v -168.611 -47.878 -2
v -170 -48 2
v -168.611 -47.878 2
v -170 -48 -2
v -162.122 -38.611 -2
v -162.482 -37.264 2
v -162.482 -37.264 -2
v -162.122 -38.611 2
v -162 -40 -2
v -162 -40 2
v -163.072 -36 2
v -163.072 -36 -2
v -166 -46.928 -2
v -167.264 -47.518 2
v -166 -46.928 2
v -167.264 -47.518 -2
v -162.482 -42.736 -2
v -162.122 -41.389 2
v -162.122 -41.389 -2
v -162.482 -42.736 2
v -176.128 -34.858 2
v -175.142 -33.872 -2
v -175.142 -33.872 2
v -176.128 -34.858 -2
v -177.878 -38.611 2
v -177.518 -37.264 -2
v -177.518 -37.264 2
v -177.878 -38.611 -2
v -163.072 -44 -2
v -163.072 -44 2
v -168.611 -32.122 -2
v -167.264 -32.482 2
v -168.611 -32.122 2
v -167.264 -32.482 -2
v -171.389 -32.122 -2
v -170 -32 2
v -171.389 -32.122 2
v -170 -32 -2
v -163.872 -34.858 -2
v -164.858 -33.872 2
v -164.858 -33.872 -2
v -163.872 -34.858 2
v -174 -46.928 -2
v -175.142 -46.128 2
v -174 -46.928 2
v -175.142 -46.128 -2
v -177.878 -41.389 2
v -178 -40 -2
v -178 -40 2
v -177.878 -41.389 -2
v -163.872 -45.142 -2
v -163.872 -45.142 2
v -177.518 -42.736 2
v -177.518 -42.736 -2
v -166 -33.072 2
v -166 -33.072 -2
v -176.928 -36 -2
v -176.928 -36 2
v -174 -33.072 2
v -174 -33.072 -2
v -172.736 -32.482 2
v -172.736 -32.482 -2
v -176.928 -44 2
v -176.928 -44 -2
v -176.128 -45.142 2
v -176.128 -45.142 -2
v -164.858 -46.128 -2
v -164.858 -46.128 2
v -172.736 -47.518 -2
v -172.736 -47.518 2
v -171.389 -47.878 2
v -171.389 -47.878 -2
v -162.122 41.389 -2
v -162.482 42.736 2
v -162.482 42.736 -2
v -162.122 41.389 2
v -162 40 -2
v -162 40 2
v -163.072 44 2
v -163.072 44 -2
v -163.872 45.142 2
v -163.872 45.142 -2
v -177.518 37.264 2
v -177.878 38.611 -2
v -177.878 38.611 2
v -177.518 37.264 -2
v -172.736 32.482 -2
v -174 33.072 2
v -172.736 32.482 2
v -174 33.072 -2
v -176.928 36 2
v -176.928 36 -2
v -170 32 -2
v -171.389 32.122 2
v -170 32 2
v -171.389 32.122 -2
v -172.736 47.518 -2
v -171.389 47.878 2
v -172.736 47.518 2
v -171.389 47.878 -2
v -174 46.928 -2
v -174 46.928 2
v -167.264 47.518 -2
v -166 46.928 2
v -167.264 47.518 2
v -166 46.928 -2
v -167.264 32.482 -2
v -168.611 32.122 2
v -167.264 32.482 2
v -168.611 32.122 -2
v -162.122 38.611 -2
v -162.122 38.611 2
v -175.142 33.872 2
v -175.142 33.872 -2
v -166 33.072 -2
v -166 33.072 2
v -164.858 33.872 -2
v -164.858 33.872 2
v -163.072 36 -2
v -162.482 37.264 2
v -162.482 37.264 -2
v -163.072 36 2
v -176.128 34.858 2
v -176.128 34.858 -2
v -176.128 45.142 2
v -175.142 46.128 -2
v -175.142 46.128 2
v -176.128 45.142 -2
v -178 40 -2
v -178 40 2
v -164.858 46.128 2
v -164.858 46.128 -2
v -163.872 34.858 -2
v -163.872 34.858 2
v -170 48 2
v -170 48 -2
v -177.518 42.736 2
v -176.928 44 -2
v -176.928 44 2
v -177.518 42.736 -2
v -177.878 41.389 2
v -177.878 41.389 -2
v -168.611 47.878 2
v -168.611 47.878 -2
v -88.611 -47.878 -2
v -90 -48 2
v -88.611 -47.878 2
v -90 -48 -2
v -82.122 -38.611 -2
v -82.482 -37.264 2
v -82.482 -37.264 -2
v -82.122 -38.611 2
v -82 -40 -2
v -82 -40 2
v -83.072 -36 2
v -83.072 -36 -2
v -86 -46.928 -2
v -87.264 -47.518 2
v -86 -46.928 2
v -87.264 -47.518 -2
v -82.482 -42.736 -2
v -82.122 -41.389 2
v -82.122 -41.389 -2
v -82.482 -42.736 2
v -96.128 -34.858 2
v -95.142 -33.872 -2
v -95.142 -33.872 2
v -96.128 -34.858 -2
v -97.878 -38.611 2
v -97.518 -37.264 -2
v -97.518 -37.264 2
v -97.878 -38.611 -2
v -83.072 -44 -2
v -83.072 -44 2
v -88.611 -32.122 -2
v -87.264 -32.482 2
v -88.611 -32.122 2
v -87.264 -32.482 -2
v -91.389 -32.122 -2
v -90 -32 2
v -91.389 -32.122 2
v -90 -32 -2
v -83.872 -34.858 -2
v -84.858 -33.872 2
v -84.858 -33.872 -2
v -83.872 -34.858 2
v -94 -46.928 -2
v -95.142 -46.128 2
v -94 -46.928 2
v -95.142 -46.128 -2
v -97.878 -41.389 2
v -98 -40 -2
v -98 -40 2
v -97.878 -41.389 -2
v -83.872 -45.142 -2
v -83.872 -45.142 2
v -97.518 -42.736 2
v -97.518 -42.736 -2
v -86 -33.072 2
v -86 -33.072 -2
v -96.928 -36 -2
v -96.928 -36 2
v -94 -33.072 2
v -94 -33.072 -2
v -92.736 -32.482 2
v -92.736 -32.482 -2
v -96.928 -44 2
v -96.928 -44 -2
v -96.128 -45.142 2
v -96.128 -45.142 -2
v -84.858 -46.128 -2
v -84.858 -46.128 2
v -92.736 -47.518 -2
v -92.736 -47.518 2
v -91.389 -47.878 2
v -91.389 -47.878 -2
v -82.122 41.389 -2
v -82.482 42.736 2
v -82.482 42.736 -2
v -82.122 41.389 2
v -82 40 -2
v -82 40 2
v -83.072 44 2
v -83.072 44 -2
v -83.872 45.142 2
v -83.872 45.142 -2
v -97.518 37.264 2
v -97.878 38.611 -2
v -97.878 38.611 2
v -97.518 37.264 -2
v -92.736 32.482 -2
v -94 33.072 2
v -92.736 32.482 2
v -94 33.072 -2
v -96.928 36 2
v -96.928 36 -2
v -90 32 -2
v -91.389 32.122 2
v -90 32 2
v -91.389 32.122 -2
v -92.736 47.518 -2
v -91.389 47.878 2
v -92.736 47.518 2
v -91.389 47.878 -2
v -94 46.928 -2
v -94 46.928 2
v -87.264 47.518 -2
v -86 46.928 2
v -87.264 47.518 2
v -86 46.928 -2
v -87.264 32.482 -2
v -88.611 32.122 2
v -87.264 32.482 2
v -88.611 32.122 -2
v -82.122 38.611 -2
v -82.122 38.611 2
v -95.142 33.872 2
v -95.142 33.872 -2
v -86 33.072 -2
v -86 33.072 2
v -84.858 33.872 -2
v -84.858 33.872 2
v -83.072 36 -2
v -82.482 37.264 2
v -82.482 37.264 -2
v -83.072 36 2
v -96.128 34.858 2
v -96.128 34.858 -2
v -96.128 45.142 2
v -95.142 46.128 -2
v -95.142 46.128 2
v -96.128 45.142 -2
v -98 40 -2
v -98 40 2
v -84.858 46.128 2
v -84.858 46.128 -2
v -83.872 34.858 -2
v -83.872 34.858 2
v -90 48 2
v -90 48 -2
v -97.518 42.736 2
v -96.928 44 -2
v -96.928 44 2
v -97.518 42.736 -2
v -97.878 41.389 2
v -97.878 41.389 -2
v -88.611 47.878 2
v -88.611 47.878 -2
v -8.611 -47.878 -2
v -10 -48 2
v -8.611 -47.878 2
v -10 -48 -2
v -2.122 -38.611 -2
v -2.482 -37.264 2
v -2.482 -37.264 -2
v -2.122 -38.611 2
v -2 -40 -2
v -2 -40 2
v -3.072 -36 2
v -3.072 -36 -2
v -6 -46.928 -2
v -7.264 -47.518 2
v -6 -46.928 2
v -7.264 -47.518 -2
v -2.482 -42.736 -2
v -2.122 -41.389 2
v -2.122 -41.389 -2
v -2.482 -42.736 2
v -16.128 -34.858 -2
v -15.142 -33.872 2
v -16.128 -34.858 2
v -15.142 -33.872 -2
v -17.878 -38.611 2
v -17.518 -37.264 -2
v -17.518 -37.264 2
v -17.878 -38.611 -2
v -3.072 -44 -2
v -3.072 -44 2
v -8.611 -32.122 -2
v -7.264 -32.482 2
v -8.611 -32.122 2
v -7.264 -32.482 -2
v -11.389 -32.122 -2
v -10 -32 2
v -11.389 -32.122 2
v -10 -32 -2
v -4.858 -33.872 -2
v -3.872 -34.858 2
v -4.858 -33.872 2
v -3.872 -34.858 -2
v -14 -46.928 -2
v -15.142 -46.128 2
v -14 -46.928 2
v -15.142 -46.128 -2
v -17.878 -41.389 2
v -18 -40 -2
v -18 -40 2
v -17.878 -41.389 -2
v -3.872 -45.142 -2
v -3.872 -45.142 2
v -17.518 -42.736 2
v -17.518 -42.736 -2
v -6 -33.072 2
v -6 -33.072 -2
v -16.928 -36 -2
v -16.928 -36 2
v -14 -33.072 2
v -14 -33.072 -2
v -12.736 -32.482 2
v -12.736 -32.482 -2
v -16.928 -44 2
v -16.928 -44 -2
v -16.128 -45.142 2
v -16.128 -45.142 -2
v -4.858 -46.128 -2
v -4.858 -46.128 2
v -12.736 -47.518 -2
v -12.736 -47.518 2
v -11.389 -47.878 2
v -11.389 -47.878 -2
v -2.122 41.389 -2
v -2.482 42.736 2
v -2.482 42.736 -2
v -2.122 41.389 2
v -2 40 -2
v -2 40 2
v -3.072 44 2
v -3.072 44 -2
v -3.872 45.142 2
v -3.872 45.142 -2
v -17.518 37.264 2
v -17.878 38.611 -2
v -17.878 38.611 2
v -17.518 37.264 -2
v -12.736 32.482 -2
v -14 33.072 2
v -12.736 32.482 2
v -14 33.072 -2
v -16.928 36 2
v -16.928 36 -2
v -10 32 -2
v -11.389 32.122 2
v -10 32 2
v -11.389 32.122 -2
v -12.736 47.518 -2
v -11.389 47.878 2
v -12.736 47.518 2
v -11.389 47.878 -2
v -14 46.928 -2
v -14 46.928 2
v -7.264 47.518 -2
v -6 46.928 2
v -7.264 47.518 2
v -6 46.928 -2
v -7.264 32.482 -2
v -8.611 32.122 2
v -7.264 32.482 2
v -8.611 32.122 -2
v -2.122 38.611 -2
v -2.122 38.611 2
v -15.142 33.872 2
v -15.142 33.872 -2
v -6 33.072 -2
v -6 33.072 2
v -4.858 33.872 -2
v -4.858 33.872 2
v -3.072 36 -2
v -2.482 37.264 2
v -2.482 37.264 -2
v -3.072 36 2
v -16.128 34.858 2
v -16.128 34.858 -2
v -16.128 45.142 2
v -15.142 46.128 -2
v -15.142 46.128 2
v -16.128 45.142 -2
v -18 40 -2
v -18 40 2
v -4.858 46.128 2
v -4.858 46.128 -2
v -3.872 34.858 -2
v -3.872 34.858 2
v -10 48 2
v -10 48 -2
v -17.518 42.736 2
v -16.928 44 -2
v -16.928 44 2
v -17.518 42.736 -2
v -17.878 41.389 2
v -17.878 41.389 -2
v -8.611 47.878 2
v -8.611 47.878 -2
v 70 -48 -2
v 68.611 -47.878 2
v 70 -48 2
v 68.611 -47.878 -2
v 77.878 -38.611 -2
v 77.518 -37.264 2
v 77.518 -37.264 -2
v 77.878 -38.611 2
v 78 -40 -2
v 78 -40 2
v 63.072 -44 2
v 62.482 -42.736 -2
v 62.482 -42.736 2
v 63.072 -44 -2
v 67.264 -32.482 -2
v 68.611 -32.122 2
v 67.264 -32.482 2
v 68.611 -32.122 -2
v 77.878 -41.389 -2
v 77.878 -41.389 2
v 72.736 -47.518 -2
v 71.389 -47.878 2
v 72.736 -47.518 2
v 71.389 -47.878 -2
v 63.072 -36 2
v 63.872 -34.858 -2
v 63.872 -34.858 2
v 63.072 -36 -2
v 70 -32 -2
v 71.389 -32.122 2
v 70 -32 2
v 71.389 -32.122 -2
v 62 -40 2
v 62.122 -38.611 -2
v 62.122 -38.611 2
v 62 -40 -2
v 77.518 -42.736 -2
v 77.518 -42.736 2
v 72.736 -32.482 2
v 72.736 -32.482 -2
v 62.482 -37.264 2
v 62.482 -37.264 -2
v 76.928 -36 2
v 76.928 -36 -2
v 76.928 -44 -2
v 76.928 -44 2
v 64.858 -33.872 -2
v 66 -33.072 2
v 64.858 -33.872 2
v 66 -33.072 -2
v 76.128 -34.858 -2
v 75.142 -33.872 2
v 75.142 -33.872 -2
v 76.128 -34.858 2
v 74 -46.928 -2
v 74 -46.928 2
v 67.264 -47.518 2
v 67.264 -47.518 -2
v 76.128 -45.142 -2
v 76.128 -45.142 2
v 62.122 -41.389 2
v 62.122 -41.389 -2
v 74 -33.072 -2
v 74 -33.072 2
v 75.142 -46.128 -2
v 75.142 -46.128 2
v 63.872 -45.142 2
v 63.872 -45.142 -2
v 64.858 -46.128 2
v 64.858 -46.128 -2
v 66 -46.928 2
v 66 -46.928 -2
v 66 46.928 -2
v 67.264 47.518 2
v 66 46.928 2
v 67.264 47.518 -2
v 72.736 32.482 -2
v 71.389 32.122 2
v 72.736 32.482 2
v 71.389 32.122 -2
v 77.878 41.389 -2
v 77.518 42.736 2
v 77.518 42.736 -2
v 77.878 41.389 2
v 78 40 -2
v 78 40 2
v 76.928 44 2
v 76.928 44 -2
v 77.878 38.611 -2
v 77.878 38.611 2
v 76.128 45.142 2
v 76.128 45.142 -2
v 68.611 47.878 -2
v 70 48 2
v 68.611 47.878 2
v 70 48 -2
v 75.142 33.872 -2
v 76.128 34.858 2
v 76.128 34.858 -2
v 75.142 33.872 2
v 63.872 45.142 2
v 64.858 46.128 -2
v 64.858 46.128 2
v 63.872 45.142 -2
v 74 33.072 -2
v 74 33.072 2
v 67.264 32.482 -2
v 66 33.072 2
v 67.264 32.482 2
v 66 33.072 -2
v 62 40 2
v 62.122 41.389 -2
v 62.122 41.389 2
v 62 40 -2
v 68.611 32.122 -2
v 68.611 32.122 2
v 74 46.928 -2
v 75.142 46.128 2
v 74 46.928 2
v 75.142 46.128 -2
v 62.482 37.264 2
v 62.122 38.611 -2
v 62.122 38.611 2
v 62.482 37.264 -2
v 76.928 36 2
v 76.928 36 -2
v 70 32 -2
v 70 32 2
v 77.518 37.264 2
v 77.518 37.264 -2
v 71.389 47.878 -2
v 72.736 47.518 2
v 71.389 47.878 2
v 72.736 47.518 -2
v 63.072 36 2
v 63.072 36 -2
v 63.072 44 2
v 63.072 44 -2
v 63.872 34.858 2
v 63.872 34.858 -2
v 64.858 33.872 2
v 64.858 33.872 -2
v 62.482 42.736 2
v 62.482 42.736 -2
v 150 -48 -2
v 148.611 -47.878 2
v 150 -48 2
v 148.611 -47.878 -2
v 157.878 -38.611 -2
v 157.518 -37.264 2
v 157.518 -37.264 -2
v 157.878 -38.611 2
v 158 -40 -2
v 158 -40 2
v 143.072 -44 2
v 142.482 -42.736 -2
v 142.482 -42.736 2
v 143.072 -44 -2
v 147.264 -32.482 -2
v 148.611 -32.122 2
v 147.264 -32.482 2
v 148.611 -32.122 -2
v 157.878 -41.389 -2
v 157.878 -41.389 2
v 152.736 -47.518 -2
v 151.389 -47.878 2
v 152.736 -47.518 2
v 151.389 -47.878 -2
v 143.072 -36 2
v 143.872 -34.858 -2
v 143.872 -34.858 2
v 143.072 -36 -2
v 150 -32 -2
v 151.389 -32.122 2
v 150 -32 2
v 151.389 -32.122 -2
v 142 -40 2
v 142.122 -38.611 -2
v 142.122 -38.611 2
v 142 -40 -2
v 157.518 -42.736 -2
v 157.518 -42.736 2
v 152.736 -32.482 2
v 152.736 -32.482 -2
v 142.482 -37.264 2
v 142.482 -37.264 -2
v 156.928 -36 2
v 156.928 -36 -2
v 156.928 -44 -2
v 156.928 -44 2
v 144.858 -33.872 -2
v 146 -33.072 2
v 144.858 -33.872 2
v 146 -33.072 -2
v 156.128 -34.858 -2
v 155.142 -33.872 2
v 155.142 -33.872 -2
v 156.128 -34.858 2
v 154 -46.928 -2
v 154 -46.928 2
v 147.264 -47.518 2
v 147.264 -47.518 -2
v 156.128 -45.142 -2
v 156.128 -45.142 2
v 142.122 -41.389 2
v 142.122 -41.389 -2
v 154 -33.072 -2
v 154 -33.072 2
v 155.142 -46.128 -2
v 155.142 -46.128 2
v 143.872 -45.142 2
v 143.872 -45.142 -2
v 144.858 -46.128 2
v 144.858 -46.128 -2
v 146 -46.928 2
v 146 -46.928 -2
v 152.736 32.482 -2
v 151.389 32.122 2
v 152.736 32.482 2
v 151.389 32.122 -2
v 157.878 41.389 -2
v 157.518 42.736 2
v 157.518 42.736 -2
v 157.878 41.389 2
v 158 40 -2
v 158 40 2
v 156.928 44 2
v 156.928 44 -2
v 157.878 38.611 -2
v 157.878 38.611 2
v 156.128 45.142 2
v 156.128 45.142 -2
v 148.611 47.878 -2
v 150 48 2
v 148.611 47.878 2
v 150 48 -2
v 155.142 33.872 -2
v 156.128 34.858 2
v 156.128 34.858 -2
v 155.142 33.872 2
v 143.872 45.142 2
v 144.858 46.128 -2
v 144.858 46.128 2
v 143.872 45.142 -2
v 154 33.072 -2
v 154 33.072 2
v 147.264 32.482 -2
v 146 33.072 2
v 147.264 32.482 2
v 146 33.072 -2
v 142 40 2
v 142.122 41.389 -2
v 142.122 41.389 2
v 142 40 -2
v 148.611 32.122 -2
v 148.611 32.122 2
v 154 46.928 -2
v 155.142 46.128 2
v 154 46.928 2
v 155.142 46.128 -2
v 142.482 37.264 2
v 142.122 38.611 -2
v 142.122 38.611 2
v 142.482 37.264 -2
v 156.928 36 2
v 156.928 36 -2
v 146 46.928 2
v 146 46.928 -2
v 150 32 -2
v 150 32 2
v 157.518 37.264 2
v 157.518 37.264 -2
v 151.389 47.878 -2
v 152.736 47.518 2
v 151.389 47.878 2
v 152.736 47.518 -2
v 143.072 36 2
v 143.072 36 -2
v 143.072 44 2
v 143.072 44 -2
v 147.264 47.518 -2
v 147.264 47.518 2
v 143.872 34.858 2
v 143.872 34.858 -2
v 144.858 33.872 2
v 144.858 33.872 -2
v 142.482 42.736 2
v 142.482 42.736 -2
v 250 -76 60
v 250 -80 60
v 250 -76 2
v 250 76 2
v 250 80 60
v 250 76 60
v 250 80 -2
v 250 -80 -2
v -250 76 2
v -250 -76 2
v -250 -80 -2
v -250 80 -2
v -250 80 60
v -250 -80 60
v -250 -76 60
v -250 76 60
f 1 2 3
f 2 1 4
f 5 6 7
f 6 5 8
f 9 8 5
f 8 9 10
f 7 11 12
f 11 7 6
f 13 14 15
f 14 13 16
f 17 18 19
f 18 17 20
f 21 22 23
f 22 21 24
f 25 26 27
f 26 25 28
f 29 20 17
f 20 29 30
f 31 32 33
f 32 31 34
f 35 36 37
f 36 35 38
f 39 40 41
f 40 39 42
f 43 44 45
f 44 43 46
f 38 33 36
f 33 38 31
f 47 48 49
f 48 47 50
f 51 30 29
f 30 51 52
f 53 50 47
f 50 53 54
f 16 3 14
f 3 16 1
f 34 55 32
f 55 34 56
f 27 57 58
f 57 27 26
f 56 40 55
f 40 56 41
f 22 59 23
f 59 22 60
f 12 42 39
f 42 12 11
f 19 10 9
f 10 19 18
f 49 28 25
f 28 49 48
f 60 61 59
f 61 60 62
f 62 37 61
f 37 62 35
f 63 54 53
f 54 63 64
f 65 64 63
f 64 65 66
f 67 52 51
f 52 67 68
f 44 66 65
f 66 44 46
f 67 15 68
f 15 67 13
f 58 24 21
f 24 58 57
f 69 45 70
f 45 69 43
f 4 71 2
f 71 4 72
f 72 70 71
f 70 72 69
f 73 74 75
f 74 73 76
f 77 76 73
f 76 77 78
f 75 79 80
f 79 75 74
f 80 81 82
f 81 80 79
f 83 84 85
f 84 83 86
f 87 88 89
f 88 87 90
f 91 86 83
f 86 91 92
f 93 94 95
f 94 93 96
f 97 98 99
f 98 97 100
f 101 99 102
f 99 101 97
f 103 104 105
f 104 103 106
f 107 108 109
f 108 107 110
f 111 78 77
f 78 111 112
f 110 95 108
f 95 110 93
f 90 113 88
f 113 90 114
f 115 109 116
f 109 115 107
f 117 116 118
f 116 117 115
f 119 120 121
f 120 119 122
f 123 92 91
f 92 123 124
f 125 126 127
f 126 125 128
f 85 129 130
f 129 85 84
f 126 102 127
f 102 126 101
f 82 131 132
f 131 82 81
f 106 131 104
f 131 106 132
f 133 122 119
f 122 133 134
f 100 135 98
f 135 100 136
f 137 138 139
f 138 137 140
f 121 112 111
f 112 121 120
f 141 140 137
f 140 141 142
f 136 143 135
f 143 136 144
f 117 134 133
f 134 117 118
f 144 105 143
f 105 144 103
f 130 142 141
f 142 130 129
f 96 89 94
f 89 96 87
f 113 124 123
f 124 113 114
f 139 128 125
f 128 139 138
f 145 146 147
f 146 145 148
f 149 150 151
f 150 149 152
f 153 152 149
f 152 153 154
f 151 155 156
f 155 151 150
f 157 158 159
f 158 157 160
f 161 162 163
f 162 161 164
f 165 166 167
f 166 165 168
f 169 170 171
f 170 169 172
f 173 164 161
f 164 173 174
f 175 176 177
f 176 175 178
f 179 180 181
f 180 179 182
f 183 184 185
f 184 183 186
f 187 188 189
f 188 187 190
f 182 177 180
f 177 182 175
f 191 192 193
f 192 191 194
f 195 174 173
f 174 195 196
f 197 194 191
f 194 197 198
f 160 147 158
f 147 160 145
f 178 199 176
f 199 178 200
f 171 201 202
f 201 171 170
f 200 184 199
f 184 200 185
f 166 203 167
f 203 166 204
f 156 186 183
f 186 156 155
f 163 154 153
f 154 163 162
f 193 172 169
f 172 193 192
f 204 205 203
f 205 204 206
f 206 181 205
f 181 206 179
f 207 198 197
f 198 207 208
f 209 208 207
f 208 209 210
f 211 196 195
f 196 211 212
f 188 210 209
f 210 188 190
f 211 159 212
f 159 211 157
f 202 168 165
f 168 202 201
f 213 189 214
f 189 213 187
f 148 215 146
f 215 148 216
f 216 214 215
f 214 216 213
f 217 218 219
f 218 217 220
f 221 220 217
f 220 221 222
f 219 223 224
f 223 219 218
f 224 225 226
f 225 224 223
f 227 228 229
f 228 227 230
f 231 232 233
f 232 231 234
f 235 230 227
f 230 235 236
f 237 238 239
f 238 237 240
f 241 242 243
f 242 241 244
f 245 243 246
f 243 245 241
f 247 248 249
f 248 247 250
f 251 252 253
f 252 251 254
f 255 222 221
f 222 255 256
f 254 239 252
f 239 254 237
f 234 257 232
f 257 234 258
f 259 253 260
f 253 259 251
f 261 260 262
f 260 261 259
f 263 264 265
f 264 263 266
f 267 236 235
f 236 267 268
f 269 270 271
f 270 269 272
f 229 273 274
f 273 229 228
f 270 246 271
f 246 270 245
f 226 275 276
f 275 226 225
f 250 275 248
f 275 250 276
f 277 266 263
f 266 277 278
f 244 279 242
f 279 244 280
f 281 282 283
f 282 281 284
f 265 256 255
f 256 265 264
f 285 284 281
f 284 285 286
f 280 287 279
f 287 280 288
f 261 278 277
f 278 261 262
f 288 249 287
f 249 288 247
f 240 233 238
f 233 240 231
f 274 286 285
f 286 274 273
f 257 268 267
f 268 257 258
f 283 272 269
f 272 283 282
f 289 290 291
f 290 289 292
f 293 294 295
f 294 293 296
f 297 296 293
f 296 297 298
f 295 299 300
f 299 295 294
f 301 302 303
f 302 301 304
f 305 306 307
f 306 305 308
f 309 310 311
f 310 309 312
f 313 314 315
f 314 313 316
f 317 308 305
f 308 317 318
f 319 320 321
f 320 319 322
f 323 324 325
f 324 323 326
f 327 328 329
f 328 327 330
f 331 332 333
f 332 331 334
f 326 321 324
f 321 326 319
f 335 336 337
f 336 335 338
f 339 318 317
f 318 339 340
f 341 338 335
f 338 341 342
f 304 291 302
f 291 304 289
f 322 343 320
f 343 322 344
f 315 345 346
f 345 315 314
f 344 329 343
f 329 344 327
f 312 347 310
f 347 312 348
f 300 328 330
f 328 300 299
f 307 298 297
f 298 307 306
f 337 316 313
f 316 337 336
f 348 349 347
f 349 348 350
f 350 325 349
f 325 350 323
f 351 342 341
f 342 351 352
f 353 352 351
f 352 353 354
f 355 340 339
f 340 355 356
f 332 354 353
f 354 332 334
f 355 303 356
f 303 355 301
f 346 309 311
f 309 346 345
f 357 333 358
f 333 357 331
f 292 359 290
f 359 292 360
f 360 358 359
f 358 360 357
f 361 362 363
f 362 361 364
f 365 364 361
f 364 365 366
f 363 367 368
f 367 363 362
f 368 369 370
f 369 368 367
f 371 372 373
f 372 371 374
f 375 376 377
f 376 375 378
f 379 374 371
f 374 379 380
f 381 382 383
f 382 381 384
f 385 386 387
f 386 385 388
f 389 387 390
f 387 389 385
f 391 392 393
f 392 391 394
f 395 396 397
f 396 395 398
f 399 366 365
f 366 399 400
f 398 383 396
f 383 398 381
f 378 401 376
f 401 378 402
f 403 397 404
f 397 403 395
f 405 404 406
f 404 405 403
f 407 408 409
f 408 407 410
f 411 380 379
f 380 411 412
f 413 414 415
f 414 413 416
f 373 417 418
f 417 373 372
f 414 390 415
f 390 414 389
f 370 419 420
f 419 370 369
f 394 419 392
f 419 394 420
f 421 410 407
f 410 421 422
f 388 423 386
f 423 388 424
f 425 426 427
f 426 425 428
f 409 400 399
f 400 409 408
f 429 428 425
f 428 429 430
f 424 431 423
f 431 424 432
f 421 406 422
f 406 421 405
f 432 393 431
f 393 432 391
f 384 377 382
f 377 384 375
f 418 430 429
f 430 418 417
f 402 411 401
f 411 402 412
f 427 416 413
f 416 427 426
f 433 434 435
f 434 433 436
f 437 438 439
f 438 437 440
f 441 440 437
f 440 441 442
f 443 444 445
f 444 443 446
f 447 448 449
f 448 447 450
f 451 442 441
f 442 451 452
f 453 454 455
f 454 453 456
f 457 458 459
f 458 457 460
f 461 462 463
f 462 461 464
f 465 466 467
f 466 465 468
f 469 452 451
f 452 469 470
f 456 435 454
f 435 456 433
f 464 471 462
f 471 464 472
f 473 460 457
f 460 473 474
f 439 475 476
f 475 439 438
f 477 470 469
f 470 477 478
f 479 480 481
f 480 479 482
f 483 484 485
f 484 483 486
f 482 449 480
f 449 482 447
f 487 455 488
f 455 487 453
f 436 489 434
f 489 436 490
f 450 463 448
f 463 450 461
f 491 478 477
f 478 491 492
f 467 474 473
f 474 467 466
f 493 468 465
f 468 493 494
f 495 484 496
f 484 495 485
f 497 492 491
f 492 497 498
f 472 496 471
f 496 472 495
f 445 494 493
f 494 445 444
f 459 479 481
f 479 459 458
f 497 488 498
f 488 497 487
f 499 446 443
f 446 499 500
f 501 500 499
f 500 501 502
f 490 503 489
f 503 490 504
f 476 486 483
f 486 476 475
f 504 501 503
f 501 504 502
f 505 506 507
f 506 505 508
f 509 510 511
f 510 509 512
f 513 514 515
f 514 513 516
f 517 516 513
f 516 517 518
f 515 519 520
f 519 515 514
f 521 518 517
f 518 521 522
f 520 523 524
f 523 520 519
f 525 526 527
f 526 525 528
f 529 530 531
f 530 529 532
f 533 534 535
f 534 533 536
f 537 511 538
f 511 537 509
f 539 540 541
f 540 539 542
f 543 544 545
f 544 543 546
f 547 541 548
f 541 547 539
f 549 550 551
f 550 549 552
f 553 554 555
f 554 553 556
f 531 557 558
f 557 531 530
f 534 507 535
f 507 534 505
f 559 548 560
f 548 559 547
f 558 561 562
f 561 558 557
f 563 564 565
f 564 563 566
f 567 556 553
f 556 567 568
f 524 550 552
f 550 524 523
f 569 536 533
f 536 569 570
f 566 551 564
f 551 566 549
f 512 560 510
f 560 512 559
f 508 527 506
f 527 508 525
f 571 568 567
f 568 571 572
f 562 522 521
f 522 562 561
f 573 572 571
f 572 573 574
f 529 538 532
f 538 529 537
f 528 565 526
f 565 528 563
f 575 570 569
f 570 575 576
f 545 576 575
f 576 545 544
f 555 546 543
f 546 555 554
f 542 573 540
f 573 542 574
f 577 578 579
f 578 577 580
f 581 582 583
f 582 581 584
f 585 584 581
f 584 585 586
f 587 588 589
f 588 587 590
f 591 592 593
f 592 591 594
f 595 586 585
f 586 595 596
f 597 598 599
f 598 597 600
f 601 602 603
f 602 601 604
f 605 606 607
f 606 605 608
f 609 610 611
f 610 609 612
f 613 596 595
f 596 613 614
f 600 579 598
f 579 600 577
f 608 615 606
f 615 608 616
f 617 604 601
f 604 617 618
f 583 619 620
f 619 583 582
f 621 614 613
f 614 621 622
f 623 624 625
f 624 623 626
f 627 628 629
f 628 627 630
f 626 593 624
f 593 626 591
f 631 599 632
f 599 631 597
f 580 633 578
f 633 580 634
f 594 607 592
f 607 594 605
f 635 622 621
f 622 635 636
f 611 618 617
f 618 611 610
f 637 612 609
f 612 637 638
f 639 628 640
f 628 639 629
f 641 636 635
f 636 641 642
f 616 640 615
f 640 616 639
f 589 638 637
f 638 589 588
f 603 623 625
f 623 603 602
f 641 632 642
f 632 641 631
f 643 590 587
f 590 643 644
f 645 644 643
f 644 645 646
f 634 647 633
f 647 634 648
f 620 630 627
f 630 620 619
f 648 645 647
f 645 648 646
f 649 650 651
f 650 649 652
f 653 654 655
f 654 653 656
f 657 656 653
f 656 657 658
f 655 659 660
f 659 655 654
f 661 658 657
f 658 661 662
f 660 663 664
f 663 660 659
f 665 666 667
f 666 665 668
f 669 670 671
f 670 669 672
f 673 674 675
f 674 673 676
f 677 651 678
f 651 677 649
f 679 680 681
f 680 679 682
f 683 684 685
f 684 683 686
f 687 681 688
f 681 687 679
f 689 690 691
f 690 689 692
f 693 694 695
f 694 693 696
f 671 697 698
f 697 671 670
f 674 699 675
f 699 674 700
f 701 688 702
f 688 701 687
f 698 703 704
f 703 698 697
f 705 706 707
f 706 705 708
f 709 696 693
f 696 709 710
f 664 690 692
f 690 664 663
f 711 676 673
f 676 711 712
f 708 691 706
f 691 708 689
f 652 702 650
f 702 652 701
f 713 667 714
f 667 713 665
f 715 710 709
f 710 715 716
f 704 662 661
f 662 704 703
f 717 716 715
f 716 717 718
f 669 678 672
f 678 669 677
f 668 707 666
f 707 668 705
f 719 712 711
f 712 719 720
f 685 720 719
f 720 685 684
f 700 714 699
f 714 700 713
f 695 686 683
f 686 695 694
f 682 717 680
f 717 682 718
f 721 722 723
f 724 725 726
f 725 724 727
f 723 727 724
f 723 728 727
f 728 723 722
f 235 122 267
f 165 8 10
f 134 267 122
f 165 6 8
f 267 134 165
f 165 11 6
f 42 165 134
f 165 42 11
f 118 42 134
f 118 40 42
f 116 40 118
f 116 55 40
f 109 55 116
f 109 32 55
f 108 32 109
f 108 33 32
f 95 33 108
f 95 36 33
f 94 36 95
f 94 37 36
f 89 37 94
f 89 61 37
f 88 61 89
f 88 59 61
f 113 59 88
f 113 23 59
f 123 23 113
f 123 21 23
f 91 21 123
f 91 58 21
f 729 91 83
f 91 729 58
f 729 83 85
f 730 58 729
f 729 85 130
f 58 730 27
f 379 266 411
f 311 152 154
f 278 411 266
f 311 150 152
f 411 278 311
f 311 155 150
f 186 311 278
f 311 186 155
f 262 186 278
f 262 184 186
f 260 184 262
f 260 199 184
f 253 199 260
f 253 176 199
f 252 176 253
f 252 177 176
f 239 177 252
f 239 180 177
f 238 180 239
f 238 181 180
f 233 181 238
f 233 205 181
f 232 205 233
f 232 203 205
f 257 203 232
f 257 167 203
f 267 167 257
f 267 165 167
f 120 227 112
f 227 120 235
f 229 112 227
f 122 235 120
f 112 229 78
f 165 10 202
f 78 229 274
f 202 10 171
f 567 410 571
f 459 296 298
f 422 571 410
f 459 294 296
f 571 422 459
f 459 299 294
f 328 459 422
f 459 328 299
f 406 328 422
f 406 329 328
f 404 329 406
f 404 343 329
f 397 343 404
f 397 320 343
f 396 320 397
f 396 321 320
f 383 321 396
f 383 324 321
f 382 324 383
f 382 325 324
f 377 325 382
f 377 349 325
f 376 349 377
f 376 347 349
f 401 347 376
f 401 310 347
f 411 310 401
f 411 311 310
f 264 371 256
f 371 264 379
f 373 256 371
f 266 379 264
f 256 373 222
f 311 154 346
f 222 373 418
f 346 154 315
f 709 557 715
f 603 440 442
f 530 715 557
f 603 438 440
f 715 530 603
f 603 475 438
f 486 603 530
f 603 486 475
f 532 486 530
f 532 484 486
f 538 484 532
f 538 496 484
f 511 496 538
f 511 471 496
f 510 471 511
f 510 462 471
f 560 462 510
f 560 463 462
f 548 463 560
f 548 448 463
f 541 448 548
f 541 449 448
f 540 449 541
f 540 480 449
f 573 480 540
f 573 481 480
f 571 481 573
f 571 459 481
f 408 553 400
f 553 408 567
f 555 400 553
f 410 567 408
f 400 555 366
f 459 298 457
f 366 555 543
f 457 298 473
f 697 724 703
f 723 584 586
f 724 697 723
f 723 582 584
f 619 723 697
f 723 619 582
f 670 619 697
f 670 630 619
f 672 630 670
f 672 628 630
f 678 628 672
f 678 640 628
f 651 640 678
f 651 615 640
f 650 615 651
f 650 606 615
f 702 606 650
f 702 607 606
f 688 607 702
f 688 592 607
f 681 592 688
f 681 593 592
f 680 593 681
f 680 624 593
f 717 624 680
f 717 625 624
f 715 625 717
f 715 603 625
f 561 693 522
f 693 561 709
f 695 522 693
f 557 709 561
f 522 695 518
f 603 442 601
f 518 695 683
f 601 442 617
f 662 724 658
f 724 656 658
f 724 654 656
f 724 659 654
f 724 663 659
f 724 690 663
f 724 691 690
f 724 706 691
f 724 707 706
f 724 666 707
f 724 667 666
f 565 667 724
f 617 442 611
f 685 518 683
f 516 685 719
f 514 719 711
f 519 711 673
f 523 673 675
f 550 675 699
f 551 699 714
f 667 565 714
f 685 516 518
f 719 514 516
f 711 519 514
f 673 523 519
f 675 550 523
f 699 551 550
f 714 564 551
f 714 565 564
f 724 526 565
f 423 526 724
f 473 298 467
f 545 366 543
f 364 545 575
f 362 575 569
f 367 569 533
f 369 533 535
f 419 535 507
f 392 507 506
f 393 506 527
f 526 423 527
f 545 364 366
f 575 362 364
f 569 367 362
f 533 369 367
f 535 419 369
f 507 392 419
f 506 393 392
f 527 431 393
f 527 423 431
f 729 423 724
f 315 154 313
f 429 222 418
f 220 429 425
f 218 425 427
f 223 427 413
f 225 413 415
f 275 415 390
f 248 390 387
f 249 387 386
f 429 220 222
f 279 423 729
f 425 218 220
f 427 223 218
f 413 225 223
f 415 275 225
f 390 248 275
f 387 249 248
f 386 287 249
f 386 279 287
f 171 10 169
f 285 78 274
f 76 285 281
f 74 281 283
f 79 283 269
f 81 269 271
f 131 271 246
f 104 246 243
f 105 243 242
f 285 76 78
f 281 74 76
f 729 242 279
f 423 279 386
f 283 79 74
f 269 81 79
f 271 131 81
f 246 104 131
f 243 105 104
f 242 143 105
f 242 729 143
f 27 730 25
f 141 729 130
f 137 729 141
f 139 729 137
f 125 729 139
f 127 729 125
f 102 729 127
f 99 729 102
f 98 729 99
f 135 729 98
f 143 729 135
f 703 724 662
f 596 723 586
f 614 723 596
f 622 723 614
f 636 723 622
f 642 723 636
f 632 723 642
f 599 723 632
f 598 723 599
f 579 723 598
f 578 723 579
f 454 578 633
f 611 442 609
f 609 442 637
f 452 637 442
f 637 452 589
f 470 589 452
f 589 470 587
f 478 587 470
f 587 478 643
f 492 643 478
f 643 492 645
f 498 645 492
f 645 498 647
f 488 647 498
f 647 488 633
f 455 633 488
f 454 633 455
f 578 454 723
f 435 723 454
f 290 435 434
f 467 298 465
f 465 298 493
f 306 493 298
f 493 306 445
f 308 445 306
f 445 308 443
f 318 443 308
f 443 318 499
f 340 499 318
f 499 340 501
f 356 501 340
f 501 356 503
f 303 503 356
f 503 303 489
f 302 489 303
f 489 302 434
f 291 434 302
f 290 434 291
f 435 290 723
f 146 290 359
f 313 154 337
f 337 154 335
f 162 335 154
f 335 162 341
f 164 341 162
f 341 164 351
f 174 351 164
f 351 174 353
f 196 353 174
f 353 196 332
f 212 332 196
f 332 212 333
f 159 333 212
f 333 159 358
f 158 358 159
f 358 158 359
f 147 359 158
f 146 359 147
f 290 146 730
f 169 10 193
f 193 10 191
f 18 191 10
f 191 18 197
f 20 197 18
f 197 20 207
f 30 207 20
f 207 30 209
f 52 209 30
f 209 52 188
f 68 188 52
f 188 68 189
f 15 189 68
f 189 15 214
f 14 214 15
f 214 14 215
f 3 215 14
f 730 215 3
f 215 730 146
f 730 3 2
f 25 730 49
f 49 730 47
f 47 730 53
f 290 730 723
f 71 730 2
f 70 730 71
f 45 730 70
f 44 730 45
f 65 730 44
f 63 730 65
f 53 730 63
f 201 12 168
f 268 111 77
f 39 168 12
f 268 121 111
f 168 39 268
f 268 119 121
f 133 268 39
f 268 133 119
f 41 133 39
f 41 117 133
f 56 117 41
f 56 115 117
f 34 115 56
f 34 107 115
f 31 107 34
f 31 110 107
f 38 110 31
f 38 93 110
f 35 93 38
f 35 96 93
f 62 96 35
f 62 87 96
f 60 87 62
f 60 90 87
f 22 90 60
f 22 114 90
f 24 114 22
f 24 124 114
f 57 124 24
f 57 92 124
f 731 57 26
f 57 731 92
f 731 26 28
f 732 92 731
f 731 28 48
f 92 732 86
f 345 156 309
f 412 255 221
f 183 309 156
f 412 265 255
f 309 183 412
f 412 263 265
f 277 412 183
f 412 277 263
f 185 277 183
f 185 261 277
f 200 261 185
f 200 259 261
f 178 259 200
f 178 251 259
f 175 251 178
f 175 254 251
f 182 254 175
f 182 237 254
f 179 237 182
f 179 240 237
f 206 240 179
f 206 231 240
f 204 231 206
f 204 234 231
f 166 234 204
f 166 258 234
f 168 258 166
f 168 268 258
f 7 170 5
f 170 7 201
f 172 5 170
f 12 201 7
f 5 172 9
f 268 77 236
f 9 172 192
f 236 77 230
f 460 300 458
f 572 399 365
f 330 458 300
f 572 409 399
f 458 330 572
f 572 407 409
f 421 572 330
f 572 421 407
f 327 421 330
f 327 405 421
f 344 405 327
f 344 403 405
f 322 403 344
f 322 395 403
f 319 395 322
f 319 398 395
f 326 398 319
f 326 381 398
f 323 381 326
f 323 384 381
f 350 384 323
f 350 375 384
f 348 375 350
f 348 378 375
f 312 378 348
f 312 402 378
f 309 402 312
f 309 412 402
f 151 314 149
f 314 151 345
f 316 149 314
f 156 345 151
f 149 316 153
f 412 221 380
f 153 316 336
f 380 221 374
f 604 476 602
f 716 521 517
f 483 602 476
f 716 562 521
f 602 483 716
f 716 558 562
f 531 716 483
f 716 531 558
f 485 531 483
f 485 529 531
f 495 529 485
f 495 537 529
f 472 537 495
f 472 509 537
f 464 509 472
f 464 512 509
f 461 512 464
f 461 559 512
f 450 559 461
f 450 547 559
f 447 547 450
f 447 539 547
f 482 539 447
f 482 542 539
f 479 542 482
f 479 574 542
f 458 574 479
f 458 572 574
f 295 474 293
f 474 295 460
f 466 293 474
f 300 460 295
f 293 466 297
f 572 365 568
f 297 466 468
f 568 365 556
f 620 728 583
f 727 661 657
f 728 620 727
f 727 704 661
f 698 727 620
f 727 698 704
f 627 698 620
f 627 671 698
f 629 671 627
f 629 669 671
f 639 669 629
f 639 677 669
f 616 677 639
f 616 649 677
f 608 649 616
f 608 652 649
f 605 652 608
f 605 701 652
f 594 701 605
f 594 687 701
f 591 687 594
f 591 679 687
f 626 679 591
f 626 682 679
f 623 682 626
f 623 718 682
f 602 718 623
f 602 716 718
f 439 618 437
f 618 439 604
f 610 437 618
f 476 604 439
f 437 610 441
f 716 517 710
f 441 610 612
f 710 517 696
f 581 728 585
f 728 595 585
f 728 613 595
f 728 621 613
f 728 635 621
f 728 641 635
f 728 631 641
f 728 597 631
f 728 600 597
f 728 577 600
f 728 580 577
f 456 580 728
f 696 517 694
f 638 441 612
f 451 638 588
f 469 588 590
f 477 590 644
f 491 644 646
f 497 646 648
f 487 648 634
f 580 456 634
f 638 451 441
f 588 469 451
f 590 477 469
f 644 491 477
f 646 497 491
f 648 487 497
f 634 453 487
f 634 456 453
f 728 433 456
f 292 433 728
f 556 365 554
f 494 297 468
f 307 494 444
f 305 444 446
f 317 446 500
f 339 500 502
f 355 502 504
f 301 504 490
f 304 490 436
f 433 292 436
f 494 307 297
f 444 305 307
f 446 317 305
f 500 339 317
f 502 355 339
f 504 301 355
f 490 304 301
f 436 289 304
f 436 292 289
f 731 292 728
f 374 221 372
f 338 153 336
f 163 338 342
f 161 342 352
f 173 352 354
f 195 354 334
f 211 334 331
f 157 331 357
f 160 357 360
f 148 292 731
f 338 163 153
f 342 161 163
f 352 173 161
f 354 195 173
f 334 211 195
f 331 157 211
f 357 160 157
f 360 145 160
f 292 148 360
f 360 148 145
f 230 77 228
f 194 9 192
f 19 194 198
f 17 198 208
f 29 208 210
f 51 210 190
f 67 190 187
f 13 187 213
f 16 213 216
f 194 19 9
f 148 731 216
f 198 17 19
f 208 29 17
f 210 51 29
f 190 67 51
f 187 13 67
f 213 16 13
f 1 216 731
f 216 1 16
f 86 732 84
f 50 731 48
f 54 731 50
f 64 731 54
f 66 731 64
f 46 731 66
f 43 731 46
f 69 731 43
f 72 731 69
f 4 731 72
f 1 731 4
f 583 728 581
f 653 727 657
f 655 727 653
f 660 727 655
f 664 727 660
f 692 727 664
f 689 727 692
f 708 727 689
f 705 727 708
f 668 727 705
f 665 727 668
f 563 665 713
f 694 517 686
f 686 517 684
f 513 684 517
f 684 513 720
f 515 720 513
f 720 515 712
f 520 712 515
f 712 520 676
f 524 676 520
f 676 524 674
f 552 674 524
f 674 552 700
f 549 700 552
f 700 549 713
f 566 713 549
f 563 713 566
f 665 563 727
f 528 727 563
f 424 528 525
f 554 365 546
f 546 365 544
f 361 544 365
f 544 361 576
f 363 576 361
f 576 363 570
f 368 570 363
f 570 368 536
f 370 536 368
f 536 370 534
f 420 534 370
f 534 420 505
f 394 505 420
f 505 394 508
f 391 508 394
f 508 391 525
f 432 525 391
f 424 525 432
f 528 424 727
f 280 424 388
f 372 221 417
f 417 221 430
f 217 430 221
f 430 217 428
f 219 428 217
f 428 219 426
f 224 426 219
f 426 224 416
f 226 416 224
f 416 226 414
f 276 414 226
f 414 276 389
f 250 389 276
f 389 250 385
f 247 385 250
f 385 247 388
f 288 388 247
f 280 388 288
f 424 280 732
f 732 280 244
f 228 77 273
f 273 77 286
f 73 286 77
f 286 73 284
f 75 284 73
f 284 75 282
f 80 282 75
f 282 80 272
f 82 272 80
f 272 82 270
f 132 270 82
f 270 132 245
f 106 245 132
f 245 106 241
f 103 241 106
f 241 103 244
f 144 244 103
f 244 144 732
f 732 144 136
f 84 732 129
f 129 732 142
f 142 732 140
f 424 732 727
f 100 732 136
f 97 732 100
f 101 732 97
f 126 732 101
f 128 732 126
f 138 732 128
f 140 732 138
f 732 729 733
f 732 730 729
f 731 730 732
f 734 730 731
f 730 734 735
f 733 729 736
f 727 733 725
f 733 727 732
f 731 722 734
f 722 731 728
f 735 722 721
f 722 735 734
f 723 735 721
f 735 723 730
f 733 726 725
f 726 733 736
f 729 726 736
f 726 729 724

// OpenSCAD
// OpenSCAD cable tray segment type B
// Units: millimeters

tray_length_mm = 500;
tray_width_mm = 160;
tray_height_mm = 60;
wall_thickness_mm = 4;
hole_diameter_mm = 16;
hole_pitch_mm = 80;

$fn = 36;

module perforated_floor() {
    difference() {
        cube([tray_length_mm, tray_width_mm, wall_thickness_mm], center = true);
        for (x = [-tray_length_mm / 2 + hole_pitch_mm : hole_pitch_mm : tray_length_mm / 2 - hole_pitch_mm]) {
            for (y = [-tray_width_mm / 4, tray_width_mm / 4]) {
                translate([x, y, 0])
                    cylinder(h = wall_thickness_mm + 2, r = hole_diameter_mm / 2, center = true);
            }
        }
    }
}

union() {
    perforated_floor();
    translate([0, -tray_width_mm / 2 + wall_thickness_mm / 2, tray_height_mm / 2])
        cube([tray_length_mm, wall_thickness_mm, tray_height_mm], center = true);
    translate([0, tray_width_mm / 2 - wall_thickness_mm / 2, tray_height_mm / 2])
        cube([tray_length_mm, wall_thickness_mm, tray_height_mm], center = true);
}
